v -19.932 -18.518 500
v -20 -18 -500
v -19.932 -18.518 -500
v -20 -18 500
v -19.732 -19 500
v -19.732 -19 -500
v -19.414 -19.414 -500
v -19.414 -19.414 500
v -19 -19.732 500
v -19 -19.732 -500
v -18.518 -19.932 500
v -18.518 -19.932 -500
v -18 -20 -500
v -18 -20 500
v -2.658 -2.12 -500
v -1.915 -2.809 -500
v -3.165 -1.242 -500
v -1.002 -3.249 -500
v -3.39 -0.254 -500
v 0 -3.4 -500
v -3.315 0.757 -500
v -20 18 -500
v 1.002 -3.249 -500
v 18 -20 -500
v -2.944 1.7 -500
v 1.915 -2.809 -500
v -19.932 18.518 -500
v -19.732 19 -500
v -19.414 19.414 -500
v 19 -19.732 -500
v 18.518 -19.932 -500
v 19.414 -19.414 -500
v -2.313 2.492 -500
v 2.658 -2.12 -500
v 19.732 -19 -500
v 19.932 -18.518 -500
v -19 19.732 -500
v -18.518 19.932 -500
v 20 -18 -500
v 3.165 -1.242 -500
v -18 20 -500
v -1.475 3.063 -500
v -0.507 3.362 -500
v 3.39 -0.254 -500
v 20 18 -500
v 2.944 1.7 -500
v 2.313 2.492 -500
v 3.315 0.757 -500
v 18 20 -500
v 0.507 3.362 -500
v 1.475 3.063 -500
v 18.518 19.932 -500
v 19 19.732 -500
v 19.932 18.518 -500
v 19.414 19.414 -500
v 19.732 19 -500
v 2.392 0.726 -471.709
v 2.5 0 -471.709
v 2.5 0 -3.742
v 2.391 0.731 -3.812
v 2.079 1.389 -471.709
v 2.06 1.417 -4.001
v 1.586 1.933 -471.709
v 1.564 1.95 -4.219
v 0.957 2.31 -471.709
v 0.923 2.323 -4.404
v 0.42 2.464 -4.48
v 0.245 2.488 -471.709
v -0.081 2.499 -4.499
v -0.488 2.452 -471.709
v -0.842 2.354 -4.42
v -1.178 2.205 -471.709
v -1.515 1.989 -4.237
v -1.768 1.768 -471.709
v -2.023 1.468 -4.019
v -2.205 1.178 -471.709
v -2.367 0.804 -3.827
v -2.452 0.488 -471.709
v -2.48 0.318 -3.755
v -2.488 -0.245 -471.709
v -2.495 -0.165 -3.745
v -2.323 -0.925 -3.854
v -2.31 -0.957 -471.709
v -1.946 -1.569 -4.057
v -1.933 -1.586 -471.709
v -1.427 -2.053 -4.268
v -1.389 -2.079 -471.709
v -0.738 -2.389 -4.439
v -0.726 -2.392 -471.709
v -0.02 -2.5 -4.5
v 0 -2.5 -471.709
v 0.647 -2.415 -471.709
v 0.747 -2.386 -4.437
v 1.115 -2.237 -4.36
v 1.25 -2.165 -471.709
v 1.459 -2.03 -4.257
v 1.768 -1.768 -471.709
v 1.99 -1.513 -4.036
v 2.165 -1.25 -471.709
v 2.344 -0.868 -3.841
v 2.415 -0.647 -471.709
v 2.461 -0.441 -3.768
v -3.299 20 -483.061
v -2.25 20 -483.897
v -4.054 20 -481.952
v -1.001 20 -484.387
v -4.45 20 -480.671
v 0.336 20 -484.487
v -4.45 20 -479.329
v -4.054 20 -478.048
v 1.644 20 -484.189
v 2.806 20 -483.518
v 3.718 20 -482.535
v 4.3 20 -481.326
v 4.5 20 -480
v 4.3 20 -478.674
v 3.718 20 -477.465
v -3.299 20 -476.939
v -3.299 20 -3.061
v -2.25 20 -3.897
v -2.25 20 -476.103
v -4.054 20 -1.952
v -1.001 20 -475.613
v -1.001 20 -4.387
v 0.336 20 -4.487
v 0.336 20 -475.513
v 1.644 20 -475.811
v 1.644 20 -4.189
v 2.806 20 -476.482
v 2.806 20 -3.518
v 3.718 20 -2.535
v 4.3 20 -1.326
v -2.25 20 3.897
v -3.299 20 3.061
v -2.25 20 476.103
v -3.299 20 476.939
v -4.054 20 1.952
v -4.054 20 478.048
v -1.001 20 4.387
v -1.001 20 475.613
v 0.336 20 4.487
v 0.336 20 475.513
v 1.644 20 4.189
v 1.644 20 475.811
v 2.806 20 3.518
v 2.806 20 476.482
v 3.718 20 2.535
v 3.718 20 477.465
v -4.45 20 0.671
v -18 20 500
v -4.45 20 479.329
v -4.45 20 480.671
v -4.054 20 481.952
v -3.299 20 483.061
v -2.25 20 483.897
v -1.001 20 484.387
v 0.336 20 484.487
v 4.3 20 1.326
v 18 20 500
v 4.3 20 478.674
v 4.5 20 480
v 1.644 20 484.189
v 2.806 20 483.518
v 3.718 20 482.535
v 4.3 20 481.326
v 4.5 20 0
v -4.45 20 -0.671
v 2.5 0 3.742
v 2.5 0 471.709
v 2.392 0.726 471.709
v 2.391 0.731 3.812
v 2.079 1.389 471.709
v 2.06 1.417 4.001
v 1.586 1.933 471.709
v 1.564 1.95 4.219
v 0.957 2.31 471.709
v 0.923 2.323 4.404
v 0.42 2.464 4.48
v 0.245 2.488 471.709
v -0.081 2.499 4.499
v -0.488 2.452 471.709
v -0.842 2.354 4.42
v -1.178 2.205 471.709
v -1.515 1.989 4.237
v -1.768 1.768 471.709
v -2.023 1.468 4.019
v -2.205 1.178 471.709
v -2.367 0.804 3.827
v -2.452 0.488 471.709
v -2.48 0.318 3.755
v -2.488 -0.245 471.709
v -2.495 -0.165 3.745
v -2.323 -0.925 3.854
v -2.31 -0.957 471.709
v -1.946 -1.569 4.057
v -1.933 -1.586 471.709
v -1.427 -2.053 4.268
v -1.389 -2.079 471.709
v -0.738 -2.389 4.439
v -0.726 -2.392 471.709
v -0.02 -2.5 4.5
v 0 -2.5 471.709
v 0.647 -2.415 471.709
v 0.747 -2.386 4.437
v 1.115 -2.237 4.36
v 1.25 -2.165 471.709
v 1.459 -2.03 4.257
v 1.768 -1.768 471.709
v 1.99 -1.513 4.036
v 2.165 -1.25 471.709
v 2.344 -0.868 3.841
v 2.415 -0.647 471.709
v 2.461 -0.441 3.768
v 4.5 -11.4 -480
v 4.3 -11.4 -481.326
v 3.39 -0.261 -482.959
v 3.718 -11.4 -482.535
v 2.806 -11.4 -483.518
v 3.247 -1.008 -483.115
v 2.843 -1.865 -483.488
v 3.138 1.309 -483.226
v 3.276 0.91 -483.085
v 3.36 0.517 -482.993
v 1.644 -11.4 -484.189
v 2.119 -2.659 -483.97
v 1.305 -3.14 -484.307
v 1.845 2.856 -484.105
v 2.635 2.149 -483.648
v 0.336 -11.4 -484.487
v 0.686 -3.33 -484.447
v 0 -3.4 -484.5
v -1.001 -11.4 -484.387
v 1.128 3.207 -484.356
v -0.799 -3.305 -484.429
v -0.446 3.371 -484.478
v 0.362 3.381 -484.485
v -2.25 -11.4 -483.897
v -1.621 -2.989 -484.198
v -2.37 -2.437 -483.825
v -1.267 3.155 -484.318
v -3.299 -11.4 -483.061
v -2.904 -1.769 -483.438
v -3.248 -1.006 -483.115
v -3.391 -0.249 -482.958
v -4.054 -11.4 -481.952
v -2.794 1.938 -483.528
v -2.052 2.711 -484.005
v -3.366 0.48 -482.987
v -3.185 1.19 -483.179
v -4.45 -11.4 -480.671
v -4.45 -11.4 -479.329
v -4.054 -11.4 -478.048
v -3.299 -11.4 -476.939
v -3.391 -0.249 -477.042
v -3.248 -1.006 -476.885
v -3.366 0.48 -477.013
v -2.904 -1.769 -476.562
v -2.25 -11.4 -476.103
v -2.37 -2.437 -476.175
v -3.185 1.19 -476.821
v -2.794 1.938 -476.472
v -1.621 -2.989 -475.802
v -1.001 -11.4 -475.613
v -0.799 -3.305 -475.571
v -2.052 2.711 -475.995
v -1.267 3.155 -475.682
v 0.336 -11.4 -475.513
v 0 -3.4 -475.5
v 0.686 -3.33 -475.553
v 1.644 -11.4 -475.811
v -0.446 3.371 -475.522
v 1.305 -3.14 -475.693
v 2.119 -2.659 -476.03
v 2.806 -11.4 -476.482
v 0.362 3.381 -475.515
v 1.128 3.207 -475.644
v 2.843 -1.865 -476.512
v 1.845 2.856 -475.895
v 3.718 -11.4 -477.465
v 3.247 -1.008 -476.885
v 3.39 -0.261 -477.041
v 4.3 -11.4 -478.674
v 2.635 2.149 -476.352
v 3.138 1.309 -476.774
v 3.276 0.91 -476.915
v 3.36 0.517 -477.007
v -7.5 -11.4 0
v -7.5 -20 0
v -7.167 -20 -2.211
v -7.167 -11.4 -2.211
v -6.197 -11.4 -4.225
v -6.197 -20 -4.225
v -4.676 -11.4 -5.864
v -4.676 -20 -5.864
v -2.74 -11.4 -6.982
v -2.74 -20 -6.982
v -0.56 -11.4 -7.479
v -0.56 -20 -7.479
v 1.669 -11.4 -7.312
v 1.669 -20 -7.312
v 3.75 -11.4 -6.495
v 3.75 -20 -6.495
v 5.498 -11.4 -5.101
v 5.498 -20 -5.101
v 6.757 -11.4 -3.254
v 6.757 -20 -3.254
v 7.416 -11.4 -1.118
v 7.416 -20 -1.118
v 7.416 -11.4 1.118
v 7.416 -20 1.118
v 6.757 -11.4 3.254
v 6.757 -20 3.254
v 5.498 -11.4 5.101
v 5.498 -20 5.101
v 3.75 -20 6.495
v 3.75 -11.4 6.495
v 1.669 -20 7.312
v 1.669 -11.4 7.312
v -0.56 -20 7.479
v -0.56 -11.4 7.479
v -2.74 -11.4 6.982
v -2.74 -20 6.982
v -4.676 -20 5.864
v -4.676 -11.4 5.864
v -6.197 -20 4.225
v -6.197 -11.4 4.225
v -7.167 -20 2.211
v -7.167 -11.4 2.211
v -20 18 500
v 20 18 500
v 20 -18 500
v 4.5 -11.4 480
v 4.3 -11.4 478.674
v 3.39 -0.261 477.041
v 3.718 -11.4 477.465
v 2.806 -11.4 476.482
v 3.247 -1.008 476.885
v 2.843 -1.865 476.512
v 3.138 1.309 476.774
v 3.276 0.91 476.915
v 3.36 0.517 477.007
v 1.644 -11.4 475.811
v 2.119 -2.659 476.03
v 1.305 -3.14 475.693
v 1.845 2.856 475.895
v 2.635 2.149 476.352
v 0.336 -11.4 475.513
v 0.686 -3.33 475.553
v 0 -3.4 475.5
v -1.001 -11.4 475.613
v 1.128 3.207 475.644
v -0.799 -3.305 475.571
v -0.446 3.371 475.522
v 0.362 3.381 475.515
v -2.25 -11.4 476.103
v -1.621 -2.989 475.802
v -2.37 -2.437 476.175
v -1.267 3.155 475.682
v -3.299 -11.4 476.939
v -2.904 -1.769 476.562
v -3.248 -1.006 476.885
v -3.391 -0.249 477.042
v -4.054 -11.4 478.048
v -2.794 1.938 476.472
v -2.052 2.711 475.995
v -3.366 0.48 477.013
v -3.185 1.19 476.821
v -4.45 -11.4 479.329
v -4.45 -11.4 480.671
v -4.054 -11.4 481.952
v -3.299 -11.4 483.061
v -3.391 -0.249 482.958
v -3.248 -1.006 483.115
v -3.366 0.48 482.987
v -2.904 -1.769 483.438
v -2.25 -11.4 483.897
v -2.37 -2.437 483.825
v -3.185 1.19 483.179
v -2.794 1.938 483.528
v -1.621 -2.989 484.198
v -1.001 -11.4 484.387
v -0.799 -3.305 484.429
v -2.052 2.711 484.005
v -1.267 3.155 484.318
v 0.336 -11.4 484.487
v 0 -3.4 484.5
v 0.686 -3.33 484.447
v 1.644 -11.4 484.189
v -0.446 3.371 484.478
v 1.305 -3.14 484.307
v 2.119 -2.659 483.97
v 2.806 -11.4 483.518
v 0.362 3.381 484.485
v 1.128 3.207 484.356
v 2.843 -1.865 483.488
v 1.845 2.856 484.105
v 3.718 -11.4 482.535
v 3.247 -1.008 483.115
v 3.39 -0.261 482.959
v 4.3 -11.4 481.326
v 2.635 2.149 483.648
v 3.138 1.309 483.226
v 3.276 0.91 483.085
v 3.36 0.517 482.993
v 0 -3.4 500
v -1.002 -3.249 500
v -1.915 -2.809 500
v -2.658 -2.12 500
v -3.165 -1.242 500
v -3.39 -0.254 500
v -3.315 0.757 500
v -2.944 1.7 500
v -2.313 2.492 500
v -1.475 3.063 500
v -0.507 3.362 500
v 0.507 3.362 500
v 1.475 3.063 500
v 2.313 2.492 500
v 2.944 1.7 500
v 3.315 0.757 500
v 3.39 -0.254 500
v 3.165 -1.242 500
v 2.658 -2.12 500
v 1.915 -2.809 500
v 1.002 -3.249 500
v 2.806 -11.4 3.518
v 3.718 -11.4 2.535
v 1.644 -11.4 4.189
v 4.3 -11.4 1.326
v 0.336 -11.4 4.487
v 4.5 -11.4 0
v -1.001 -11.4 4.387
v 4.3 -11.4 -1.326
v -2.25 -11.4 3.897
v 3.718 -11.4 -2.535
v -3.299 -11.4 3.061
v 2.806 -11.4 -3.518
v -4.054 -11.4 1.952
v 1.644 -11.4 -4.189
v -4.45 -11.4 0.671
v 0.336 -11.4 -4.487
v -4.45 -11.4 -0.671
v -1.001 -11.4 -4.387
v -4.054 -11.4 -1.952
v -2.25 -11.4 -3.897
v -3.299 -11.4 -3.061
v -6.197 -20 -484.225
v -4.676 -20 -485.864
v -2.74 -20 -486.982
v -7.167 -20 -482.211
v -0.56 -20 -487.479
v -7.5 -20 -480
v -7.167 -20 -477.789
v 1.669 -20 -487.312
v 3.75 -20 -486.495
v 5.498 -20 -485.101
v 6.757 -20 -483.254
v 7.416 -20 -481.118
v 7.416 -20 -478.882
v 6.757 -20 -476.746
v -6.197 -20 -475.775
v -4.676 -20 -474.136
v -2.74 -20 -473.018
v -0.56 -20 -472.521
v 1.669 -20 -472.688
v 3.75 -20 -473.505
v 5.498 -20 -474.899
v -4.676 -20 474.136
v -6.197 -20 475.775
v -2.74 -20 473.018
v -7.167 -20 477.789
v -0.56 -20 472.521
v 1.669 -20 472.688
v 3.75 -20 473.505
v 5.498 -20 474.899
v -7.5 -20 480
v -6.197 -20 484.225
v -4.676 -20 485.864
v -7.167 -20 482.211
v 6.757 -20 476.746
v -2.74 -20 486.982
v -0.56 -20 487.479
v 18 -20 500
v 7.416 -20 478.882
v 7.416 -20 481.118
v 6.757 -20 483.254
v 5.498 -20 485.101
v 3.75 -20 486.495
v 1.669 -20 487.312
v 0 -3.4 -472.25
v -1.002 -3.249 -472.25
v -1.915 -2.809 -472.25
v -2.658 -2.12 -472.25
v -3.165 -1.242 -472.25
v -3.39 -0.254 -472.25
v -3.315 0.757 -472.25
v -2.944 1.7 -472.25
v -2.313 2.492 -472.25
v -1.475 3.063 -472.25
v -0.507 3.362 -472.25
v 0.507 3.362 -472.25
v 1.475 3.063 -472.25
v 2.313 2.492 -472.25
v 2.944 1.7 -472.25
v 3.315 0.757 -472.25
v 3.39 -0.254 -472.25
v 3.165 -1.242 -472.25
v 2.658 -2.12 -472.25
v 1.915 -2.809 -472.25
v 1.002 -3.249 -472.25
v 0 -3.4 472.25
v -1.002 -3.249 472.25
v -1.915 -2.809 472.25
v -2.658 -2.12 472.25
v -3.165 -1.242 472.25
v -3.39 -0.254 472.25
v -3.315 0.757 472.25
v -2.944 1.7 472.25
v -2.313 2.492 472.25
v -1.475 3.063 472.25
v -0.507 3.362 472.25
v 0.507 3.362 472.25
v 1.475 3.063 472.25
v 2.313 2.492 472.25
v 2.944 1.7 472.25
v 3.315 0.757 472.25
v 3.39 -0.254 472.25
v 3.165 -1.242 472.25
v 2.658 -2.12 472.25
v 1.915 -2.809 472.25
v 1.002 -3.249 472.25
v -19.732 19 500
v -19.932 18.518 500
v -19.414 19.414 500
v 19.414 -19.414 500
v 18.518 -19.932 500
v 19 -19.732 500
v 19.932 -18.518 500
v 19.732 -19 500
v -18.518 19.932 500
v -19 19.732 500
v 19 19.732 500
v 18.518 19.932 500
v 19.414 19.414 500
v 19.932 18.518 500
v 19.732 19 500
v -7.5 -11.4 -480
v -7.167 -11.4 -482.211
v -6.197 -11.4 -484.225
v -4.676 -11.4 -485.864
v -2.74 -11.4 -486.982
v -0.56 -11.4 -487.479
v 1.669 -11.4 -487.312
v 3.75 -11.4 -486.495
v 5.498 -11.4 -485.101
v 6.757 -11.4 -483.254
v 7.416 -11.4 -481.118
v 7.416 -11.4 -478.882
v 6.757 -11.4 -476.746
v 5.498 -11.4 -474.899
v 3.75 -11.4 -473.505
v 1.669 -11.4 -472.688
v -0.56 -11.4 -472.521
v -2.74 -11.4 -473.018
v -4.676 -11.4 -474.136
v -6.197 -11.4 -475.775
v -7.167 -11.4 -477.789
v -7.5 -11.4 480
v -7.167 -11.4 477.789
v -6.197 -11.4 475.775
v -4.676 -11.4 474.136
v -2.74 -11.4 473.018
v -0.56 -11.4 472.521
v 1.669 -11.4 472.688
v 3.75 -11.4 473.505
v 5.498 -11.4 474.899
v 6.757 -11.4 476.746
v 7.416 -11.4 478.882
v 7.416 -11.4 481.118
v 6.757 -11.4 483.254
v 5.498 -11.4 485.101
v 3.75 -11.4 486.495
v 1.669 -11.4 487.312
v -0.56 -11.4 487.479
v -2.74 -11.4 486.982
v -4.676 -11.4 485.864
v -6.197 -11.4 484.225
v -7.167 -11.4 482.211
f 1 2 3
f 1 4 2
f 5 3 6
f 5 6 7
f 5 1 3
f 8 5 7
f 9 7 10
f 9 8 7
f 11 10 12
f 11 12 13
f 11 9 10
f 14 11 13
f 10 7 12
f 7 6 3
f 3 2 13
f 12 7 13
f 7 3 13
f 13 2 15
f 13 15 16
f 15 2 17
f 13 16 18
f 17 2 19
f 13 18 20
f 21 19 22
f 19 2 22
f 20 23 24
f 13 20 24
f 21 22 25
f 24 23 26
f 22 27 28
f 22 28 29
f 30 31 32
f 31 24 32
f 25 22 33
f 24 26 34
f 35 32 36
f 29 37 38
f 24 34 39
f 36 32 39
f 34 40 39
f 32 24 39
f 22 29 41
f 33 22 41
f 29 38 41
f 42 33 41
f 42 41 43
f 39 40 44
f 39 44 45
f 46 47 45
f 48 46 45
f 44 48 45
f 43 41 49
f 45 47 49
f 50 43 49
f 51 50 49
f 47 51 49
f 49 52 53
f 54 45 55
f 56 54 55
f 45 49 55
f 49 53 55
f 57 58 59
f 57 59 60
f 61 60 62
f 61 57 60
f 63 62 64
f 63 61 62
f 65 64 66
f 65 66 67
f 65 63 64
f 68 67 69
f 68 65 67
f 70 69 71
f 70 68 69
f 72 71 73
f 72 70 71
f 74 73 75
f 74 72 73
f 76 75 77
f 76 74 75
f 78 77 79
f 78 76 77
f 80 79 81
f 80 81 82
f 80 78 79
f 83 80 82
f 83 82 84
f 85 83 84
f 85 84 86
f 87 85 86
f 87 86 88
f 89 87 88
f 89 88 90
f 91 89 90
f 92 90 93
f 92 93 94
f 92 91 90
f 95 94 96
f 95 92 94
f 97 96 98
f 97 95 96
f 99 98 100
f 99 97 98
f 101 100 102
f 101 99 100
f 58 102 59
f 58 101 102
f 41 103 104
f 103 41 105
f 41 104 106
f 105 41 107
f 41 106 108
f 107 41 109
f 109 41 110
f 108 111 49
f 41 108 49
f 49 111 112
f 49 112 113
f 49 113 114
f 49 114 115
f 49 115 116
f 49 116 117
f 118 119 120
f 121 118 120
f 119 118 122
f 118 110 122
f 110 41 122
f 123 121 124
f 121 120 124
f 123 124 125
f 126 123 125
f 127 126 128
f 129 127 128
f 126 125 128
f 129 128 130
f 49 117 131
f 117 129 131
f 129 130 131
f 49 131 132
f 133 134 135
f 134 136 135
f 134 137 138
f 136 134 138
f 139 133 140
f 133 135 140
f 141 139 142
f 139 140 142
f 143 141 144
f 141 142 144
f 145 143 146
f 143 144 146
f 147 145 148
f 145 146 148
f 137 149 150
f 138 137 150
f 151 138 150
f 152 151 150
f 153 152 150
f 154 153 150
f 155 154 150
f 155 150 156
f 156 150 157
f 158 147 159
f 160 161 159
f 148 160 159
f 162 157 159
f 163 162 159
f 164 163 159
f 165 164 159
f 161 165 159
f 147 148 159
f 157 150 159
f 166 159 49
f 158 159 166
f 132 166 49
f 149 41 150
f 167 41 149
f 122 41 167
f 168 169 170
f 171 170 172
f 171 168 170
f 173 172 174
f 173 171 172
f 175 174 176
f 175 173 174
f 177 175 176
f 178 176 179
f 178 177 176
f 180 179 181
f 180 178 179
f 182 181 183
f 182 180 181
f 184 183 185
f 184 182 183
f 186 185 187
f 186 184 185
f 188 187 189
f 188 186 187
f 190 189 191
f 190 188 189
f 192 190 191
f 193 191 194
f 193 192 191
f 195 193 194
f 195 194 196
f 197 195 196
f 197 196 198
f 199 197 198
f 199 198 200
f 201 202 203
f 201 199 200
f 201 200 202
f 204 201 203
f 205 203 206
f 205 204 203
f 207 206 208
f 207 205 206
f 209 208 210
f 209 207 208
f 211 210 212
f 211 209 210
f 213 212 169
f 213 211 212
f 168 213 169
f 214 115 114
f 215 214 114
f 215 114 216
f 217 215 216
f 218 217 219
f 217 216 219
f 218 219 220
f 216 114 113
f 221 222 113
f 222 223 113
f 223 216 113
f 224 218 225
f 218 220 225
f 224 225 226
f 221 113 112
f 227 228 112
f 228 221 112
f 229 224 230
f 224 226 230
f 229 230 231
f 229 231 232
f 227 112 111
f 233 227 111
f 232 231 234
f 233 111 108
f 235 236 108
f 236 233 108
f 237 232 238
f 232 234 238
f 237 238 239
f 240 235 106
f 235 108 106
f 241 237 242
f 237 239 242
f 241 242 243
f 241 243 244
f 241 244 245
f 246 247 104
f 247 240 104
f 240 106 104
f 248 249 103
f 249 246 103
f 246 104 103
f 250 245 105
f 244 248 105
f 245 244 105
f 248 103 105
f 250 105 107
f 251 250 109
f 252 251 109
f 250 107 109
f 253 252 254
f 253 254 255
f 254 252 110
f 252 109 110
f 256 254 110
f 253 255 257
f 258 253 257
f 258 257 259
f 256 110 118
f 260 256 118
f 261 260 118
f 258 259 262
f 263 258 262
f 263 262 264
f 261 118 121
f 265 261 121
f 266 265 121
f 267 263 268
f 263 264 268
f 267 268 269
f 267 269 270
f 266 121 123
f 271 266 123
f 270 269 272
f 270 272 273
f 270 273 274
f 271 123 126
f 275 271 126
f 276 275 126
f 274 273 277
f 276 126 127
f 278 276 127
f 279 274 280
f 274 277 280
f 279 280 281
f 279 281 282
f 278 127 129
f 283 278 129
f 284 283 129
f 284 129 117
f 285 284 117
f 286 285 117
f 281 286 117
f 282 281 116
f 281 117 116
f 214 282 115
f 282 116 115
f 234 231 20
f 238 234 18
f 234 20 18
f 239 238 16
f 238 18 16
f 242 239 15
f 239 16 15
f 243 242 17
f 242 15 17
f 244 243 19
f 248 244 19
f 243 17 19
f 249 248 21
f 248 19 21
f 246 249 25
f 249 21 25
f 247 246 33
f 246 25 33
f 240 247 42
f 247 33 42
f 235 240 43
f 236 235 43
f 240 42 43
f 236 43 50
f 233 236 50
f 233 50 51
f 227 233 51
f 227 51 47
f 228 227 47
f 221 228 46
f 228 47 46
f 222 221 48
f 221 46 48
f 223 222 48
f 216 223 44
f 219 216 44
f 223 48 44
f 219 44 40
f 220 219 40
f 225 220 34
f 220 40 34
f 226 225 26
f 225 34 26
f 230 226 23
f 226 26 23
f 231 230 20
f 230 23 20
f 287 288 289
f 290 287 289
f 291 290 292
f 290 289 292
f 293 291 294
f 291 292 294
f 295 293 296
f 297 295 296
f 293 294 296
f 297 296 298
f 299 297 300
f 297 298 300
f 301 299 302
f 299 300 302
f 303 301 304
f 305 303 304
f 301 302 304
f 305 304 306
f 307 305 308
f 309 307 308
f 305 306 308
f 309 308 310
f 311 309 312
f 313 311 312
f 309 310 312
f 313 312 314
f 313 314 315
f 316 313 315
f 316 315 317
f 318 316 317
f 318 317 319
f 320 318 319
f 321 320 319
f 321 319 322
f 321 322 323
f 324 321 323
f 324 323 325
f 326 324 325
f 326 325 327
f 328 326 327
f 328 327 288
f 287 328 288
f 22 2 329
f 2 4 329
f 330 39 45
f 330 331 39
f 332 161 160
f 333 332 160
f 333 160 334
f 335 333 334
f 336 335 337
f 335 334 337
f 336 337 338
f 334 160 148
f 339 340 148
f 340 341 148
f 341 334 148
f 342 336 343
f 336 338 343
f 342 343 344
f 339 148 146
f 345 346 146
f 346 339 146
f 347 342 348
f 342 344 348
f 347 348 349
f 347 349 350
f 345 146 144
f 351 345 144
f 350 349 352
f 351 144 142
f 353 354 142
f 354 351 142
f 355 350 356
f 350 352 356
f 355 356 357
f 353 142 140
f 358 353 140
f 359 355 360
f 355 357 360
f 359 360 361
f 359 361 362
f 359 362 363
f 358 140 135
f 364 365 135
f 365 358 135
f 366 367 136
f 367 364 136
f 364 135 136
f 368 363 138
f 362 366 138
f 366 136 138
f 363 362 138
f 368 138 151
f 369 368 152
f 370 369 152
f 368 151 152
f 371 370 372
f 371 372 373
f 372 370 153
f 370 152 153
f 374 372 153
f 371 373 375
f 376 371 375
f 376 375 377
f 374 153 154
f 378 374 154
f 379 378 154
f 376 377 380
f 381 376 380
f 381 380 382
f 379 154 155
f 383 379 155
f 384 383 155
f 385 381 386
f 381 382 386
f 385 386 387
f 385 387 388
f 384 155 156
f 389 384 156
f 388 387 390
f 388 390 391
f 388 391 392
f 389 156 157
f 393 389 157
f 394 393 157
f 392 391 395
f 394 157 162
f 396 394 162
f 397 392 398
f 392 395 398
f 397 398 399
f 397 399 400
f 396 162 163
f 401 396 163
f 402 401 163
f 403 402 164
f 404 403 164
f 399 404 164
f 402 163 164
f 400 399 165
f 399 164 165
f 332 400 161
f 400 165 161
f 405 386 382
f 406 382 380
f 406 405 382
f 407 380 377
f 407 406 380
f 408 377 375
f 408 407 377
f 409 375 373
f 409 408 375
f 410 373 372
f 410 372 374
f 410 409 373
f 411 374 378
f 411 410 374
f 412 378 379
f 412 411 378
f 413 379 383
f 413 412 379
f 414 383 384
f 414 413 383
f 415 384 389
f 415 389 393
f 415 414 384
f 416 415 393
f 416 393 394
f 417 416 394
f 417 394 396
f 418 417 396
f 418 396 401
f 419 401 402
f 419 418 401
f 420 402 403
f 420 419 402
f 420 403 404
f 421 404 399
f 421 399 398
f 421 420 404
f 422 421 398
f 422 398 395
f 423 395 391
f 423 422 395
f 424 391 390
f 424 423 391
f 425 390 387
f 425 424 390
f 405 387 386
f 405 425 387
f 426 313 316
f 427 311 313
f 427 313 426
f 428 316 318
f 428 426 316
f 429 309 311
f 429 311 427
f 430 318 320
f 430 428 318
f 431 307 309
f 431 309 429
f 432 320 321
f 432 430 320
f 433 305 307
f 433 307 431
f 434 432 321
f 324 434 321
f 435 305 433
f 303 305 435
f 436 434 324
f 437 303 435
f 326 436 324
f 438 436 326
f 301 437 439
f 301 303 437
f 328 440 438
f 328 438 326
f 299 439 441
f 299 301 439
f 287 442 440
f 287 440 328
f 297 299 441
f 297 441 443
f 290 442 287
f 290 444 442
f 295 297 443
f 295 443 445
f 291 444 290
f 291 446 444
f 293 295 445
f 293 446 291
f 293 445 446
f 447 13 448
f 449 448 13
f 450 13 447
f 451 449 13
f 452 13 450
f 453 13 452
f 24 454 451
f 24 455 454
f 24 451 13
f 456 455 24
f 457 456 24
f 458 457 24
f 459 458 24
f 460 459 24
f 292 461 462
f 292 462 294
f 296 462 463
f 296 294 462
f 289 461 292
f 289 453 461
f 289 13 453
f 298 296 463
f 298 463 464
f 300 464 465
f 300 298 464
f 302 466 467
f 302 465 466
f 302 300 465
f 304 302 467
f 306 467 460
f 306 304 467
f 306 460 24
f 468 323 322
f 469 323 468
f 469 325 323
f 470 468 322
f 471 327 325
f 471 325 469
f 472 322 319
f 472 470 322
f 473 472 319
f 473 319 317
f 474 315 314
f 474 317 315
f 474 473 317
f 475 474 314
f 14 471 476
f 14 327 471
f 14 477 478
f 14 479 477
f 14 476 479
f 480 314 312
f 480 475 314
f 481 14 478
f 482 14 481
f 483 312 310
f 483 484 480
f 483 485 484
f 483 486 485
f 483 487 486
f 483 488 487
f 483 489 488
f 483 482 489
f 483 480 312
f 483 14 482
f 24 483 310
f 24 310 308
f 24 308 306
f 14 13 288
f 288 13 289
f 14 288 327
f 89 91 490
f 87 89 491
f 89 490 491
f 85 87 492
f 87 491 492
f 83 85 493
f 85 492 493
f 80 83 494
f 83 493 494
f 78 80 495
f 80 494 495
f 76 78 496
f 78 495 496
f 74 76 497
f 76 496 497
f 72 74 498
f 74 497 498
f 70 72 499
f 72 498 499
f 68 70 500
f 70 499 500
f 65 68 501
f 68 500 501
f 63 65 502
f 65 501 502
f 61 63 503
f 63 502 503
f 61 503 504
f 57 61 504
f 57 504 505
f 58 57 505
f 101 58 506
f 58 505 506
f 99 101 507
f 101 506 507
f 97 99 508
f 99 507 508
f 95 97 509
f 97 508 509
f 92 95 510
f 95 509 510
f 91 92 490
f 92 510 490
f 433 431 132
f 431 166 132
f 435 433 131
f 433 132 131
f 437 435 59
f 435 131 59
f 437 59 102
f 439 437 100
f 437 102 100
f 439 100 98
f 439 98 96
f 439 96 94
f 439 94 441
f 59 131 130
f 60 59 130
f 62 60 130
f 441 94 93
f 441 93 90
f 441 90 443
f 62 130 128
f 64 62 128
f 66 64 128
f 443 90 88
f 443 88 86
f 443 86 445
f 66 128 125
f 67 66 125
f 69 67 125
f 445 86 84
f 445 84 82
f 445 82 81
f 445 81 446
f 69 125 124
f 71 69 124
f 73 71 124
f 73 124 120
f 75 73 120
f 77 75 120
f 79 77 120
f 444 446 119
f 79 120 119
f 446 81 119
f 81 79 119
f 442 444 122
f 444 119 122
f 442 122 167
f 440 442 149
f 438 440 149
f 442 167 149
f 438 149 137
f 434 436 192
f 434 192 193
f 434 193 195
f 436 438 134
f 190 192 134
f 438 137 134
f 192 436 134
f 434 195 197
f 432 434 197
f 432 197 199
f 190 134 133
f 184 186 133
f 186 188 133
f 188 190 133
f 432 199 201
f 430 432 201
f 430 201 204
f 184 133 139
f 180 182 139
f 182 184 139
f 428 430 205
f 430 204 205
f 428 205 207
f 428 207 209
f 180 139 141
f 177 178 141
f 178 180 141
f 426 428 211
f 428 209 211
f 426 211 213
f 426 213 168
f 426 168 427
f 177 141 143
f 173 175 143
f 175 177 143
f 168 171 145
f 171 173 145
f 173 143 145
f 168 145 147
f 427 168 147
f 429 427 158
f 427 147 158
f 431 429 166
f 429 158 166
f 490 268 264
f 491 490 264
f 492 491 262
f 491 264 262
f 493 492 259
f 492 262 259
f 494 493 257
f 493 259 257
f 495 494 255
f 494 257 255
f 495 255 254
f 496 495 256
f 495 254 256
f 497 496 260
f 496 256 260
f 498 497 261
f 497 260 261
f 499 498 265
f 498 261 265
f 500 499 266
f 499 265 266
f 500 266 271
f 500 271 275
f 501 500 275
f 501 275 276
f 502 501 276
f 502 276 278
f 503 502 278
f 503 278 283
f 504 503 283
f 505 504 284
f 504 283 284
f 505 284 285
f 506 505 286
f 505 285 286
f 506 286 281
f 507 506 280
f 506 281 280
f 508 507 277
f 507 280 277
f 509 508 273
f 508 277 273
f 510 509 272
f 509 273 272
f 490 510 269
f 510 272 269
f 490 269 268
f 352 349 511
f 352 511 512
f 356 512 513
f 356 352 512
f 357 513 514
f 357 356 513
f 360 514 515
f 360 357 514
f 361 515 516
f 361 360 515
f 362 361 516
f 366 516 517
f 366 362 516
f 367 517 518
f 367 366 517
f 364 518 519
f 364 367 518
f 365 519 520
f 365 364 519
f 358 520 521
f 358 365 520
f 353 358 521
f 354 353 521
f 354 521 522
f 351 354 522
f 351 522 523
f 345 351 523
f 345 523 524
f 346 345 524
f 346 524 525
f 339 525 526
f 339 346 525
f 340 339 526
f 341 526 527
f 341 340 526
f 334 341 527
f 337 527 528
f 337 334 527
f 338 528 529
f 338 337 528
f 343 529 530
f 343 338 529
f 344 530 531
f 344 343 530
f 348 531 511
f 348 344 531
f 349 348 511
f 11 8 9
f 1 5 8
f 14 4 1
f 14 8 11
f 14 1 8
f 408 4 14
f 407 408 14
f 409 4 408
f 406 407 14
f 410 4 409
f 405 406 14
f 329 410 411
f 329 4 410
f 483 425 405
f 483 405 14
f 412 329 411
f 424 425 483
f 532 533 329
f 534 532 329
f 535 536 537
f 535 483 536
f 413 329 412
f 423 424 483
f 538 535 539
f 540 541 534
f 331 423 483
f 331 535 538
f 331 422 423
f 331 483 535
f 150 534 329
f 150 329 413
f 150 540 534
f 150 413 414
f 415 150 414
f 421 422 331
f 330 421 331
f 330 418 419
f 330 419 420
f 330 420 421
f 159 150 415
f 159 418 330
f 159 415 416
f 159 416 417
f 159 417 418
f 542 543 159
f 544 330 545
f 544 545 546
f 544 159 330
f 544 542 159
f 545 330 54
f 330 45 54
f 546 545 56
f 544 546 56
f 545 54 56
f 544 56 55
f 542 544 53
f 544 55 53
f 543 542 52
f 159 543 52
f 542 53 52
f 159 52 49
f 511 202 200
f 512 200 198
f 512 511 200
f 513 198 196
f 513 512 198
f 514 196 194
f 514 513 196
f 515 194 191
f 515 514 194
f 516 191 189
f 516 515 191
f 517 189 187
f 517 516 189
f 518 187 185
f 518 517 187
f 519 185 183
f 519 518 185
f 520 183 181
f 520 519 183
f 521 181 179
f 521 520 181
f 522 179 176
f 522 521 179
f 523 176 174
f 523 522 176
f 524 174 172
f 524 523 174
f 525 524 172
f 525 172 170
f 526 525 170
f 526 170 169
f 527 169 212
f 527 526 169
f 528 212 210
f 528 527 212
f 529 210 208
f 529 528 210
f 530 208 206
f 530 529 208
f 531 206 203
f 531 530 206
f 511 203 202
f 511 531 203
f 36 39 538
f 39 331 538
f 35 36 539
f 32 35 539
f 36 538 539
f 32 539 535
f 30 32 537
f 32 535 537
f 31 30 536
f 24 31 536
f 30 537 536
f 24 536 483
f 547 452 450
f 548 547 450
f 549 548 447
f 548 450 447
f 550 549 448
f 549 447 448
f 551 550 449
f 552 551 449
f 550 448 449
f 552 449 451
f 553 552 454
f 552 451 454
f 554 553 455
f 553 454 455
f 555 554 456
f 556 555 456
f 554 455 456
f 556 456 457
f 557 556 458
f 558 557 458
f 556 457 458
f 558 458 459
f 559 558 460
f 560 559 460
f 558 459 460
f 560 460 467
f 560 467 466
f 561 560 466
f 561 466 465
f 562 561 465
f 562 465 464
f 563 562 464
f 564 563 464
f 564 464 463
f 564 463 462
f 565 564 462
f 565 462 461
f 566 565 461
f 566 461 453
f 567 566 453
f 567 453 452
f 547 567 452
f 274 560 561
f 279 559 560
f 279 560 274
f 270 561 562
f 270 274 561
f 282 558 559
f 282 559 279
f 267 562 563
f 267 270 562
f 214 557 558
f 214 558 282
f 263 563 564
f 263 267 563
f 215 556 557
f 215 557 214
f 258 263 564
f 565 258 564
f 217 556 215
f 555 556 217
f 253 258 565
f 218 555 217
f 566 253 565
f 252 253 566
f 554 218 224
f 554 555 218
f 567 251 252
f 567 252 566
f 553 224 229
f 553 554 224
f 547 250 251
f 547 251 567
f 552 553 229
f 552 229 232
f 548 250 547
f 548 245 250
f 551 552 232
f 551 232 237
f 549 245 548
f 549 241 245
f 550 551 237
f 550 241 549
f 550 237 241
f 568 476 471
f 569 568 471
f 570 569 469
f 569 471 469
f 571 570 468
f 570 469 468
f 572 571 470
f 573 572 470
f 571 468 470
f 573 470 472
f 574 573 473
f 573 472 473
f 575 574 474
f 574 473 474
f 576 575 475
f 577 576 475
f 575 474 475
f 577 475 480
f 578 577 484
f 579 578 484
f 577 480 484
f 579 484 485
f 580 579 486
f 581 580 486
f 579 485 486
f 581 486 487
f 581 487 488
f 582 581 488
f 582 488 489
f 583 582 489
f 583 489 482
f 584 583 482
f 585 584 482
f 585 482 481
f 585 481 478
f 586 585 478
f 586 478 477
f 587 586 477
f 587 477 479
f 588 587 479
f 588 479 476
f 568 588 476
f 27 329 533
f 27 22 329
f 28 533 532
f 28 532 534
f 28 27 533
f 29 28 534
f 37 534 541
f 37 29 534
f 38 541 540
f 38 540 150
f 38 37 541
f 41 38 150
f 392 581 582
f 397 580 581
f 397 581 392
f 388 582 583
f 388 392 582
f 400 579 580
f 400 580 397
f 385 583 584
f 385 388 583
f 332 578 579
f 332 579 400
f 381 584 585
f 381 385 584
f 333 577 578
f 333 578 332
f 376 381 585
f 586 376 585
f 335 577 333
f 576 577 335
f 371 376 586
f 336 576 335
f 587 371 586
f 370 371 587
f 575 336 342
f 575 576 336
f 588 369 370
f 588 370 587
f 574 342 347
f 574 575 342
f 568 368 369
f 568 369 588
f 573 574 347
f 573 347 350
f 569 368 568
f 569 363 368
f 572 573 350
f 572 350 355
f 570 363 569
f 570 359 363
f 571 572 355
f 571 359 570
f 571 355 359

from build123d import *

# Parameters (mm, degrees)
SKETCH1_W                                           = 40
SKETCH1_H                                           = 40
SKETCH1_R                                           = 2.5
BOSS_EXTRUDE1_DEPTH                                 = 500
FILLET1_R                                           = 2
CBORE_FOR_M8_HEX_SOCKET_HEAD_CAP_SCREW1_D           = 9
CBORE_FOR_M8_HEX_SOCKET_HEAD_CAP_SCREW1_CBORE_D     = 15
CBORE_FOR_M8_HEX_SOCKET_HEAD_CAP_SCREW1_CBORE_DEPTH = 8.6


with BuildPart() as part:
    # Sketch1 → Boss-Extrude1 (new, symmetric)
    with BuildSketch(Plane.XY):
        Rectangle(SKETCH1_W, SKETCH1_H)
        Circle(SKETCH1_R, mode=Mode.SUBTRACT)
    extrude(amount=BOSS_EXTRUDE1_DEPTH, both=True)

    # Fillet1
    fillet1_edges = [part.edges().sort_by_distance(p)[0] for p in [
        (20, -20, 0),
        (-20, -20, 0),
        (-20, 20, 0),
        (20, 20, 0),
    ]]
    fillet(fillet1_edges, radius=FILLET1_R)

    # CBORE for M8 Hex Socket Head Cap Screw1 (through all)
    with Locations(Plane(origin=(0, -20, 0), x_dir=(-1, 0, 0), z_dir=(0, -1, 0))):
        with Locations((0, -480), (0, 0), (0, 480)):
            CounterBoreHole(CBORE_FOR_M8_HEX_SOCKET_HEAD_CAP_SCREW1_D / 2, CBORE_FOR_M8_HEX_SOCKET_HEAD_CAP_SCREW1_CBORE_D / 2, CBORE_FOR_M8_HEX_SOCKET_HEAD_CAP_SCREW1_CBORE_DEPTH)

    # Sketch9 → M8x1.25 Tapped Hole1 (revolve, cut)
    with BuildSketch(Plane(origin=(0, 0, 500), x_dir=(0, -1, 0), z_dir=(1, 0, 0))):
        Polygon((0, 0), (0, 29.792926105), (3.4, 27.75), (3.4, 0), align=None)
    m8x1_25_tapped_hole1 = revolve(axis=Axis((0, 0, 506.35), (0, 0, -1)), mode=Mode.SUBTRACT)

    # Mirror1: M8x1.25 Tapped Hole1 across plane
    add(m8x1_25_tapped_hole1.mirror(Plane.XY), mode=Mode.SUBTRACT)


solid = part.part
